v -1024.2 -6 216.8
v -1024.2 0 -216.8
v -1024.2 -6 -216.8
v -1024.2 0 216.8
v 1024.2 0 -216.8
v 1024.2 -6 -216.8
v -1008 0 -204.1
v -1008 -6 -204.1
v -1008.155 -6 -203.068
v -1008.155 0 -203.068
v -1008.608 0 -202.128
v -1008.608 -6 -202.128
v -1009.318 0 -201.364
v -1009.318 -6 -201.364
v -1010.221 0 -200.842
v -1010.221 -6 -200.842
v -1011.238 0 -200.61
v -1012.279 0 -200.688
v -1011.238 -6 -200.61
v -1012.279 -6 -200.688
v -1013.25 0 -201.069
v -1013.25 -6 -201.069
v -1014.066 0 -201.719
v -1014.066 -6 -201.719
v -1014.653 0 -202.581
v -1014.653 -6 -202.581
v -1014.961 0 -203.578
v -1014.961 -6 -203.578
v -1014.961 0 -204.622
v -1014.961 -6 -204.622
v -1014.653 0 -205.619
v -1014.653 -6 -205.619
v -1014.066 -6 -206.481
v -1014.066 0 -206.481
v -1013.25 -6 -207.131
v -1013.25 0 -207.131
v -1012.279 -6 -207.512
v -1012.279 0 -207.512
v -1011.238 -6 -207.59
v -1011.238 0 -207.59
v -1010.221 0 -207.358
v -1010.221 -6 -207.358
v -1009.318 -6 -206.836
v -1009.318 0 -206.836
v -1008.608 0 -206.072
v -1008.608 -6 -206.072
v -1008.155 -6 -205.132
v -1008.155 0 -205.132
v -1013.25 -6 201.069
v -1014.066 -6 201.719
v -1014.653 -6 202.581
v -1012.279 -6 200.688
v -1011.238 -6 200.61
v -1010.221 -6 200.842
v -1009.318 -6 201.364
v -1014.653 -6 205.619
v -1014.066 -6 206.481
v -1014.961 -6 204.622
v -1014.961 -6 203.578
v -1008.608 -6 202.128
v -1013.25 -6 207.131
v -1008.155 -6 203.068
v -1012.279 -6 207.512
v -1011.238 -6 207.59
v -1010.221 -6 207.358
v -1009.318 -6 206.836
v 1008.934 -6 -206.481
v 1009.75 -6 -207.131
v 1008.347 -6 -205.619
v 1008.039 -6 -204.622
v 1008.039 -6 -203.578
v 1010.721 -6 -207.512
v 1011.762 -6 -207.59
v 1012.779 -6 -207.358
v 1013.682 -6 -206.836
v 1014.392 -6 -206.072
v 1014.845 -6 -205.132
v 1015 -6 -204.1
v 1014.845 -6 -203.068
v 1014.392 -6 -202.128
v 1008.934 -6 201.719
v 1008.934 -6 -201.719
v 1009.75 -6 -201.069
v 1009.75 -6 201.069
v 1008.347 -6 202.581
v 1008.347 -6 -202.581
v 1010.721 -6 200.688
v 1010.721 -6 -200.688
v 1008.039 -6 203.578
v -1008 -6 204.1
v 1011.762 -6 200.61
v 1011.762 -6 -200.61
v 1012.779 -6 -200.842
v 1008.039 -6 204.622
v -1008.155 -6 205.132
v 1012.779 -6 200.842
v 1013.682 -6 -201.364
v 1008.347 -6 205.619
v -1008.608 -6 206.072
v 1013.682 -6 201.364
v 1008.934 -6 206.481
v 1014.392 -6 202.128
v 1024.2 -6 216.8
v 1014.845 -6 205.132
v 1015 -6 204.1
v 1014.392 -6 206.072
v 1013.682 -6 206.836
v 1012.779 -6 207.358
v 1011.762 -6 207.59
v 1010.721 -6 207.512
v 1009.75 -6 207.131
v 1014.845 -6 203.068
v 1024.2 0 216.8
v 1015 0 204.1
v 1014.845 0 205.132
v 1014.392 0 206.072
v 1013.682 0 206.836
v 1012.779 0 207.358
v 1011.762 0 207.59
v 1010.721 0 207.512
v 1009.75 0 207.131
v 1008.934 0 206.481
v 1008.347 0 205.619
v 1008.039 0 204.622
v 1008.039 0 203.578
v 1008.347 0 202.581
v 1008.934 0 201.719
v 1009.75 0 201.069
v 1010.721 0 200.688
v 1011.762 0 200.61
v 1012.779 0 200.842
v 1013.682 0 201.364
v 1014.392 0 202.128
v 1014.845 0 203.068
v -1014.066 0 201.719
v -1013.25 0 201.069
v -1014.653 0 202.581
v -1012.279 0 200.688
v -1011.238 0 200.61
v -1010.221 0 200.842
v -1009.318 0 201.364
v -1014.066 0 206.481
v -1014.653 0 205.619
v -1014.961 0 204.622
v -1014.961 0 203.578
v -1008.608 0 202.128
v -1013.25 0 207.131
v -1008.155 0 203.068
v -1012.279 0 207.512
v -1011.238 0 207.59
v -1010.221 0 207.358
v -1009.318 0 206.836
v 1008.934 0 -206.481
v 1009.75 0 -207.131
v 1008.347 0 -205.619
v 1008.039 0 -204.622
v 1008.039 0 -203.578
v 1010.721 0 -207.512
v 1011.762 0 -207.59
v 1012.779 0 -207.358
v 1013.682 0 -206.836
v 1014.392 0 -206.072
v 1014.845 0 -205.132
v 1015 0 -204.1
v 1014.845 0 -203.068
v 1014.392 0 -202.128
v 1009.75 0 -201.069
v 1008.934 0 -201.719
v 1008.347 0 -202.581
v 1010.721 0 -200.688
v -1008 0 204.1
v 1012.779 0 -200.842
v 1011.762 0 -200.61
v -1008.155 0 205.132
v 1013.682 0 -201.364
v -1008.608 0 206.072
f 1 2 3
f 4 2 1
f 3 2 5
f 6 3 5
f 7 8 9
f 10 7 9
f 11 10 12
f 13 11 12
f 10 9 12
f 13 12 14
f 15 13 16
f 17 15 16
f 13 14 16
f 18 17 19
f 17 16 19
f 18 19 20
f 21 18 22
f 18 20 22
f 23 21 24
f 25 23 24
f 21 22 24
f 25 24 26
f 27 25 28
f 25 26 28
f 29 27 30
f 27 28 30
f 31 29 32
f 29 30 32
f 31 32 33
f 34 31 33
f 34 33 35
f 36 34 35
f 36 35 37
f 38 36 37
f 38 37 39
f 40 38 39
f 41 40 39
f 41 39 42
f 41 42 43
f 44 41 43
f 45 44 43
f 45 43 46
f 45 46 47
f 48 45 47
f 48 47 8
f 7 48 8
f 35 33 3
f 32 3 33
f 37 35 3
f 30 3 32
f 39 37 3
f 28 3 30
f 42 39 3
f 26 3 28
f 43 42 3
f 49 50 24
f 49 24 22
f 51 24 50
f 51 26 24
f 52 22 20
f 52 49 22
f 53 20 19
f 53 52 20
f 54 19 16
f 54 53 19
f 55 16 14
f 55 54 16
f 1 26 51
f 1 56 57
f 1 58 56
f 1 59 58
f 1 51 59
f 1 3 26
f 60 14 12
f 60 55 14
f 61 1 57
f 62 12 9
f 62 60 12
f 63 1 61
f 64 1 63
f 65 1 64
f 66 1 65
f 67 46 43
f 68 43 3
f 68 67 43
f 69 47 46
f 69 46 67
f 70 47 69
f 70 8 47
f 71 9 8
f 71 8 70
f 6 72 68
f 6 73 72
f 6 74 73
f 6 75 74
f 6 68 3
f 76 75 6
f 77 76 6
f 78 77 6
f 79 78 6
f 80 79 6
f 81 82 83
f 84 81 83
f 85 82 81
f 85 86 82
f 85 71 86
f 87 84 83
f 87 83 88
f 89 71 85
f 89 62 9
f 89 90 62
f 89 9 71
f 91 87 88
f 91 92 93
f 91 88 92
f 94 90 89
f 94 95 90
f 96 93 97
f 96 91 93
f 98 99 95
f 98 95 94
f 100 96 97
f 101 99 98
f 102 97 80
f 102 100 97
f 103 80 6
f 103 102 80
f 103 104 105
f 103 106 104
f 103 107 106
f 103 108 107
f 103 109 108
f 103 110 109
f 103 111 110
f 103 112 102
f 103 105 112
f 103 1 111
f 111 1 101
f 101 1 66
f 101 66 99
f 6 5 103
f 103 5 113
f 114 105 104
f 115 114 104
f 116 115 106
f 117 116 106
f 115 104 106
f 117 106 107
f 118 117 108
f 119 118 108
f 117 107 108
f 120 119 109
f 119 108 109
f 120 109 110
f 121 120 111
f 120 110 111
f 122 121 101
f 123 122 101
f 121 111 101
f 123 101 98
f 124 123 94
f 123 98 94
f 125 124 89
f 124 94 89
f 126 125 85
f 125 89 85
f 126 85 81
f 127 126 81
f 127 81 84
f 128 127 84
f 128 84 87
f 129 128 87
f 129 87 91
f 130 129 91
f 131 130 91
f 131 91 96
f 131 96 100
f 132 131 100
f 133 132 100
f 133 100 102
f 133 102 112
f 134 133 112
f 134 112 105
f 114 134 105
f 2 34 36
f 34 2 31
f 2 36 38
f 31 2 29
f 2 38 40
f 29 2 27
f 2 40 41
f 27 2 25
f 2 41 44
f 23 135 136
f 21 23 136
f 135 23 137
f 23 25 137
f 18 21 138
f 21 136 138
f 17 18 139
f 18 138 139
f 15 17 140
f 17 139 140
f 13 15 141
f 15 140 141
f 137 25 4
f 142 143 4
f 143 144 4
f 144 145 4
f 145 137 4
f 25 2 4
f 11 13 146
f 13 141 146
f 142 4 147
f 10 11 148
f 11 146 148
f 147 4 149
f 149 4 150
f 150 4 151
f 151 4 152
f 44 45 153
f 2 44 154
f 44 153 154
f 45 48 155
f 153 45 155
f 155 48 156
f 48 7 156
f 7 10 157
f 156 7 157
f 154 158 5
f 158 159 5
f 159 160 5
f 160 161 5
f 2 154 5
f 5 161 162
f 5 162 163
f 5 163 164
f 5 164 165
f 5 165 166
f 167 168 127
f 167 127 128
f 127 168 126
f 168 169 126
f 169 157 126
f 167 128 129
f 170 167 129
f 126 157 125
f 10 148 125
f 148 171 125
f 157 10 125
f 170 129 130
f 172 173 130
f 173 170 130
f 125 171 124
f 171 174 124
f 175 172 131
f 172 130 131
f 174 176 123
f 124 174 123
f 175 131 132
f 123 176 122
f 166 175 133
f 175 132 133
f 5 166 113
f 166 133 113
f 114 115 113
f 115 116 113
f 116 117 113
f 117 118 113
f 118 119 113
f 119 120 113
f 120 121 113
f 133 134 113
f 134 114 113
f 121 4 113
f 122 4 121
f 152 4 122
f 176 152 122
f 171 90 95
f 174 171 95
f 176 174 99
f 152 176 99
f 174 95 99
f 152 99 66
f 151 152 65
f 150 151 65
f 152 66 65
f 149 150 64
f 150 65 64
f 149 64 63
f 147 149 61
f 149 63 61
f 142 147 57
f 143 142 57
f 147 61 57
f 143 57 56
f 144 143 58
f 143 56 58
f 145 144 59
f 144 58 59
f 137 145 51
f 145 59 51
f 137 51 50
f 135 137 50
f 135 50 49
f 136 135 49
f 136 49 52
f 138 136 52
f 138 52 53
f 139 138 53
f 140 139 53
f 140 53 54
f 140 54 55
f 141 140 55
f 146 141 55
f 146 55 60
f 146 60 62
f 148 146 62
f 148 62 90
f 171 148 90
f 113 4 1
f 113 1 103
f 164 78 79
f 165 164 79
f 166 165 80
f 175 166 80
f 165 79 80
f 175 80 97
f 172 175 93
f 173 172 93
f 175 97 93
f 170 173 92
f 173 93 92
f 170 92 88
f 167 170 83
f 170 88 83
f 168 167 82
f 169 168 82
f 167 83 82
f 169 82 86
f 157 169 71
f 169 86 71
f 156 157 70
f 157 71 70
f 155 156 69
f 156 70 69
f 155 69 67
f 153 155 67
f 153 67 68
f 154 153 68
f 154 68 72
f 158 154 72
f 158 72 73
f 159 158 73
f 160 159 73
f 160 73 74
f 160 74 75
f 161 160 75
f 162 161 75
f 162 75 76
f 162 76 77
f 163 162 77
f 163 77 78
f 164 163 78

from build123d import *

# Parameters (mm, degrees)
F0_W     = 2048.4
F0_H     = 433.6
F1_DEPTH = 6
F3_D     = 7
F3_DEPTH = 100


with BuildPart() as f1:
    # F0 (on Front) → F1 (new body)
    with BuildSketch(Plane.XZ):
        Rectangle(F0_W, F0_H)
    extrude(amount=F1_DEPTH)

    # F3
    with Locations(Plane(origin=(0, 0, 0), x_dir=(-1, 0, 0), z_dir=(0, 1, 0))):
        with Locations((1011.5, 204.1), (1011.5, -204.1), (-1011.5, 204.1), (-1011.5, -204.1)):
            Hole(F3_D / 2, depth=F3_DEPTH)


solid = f1.part
